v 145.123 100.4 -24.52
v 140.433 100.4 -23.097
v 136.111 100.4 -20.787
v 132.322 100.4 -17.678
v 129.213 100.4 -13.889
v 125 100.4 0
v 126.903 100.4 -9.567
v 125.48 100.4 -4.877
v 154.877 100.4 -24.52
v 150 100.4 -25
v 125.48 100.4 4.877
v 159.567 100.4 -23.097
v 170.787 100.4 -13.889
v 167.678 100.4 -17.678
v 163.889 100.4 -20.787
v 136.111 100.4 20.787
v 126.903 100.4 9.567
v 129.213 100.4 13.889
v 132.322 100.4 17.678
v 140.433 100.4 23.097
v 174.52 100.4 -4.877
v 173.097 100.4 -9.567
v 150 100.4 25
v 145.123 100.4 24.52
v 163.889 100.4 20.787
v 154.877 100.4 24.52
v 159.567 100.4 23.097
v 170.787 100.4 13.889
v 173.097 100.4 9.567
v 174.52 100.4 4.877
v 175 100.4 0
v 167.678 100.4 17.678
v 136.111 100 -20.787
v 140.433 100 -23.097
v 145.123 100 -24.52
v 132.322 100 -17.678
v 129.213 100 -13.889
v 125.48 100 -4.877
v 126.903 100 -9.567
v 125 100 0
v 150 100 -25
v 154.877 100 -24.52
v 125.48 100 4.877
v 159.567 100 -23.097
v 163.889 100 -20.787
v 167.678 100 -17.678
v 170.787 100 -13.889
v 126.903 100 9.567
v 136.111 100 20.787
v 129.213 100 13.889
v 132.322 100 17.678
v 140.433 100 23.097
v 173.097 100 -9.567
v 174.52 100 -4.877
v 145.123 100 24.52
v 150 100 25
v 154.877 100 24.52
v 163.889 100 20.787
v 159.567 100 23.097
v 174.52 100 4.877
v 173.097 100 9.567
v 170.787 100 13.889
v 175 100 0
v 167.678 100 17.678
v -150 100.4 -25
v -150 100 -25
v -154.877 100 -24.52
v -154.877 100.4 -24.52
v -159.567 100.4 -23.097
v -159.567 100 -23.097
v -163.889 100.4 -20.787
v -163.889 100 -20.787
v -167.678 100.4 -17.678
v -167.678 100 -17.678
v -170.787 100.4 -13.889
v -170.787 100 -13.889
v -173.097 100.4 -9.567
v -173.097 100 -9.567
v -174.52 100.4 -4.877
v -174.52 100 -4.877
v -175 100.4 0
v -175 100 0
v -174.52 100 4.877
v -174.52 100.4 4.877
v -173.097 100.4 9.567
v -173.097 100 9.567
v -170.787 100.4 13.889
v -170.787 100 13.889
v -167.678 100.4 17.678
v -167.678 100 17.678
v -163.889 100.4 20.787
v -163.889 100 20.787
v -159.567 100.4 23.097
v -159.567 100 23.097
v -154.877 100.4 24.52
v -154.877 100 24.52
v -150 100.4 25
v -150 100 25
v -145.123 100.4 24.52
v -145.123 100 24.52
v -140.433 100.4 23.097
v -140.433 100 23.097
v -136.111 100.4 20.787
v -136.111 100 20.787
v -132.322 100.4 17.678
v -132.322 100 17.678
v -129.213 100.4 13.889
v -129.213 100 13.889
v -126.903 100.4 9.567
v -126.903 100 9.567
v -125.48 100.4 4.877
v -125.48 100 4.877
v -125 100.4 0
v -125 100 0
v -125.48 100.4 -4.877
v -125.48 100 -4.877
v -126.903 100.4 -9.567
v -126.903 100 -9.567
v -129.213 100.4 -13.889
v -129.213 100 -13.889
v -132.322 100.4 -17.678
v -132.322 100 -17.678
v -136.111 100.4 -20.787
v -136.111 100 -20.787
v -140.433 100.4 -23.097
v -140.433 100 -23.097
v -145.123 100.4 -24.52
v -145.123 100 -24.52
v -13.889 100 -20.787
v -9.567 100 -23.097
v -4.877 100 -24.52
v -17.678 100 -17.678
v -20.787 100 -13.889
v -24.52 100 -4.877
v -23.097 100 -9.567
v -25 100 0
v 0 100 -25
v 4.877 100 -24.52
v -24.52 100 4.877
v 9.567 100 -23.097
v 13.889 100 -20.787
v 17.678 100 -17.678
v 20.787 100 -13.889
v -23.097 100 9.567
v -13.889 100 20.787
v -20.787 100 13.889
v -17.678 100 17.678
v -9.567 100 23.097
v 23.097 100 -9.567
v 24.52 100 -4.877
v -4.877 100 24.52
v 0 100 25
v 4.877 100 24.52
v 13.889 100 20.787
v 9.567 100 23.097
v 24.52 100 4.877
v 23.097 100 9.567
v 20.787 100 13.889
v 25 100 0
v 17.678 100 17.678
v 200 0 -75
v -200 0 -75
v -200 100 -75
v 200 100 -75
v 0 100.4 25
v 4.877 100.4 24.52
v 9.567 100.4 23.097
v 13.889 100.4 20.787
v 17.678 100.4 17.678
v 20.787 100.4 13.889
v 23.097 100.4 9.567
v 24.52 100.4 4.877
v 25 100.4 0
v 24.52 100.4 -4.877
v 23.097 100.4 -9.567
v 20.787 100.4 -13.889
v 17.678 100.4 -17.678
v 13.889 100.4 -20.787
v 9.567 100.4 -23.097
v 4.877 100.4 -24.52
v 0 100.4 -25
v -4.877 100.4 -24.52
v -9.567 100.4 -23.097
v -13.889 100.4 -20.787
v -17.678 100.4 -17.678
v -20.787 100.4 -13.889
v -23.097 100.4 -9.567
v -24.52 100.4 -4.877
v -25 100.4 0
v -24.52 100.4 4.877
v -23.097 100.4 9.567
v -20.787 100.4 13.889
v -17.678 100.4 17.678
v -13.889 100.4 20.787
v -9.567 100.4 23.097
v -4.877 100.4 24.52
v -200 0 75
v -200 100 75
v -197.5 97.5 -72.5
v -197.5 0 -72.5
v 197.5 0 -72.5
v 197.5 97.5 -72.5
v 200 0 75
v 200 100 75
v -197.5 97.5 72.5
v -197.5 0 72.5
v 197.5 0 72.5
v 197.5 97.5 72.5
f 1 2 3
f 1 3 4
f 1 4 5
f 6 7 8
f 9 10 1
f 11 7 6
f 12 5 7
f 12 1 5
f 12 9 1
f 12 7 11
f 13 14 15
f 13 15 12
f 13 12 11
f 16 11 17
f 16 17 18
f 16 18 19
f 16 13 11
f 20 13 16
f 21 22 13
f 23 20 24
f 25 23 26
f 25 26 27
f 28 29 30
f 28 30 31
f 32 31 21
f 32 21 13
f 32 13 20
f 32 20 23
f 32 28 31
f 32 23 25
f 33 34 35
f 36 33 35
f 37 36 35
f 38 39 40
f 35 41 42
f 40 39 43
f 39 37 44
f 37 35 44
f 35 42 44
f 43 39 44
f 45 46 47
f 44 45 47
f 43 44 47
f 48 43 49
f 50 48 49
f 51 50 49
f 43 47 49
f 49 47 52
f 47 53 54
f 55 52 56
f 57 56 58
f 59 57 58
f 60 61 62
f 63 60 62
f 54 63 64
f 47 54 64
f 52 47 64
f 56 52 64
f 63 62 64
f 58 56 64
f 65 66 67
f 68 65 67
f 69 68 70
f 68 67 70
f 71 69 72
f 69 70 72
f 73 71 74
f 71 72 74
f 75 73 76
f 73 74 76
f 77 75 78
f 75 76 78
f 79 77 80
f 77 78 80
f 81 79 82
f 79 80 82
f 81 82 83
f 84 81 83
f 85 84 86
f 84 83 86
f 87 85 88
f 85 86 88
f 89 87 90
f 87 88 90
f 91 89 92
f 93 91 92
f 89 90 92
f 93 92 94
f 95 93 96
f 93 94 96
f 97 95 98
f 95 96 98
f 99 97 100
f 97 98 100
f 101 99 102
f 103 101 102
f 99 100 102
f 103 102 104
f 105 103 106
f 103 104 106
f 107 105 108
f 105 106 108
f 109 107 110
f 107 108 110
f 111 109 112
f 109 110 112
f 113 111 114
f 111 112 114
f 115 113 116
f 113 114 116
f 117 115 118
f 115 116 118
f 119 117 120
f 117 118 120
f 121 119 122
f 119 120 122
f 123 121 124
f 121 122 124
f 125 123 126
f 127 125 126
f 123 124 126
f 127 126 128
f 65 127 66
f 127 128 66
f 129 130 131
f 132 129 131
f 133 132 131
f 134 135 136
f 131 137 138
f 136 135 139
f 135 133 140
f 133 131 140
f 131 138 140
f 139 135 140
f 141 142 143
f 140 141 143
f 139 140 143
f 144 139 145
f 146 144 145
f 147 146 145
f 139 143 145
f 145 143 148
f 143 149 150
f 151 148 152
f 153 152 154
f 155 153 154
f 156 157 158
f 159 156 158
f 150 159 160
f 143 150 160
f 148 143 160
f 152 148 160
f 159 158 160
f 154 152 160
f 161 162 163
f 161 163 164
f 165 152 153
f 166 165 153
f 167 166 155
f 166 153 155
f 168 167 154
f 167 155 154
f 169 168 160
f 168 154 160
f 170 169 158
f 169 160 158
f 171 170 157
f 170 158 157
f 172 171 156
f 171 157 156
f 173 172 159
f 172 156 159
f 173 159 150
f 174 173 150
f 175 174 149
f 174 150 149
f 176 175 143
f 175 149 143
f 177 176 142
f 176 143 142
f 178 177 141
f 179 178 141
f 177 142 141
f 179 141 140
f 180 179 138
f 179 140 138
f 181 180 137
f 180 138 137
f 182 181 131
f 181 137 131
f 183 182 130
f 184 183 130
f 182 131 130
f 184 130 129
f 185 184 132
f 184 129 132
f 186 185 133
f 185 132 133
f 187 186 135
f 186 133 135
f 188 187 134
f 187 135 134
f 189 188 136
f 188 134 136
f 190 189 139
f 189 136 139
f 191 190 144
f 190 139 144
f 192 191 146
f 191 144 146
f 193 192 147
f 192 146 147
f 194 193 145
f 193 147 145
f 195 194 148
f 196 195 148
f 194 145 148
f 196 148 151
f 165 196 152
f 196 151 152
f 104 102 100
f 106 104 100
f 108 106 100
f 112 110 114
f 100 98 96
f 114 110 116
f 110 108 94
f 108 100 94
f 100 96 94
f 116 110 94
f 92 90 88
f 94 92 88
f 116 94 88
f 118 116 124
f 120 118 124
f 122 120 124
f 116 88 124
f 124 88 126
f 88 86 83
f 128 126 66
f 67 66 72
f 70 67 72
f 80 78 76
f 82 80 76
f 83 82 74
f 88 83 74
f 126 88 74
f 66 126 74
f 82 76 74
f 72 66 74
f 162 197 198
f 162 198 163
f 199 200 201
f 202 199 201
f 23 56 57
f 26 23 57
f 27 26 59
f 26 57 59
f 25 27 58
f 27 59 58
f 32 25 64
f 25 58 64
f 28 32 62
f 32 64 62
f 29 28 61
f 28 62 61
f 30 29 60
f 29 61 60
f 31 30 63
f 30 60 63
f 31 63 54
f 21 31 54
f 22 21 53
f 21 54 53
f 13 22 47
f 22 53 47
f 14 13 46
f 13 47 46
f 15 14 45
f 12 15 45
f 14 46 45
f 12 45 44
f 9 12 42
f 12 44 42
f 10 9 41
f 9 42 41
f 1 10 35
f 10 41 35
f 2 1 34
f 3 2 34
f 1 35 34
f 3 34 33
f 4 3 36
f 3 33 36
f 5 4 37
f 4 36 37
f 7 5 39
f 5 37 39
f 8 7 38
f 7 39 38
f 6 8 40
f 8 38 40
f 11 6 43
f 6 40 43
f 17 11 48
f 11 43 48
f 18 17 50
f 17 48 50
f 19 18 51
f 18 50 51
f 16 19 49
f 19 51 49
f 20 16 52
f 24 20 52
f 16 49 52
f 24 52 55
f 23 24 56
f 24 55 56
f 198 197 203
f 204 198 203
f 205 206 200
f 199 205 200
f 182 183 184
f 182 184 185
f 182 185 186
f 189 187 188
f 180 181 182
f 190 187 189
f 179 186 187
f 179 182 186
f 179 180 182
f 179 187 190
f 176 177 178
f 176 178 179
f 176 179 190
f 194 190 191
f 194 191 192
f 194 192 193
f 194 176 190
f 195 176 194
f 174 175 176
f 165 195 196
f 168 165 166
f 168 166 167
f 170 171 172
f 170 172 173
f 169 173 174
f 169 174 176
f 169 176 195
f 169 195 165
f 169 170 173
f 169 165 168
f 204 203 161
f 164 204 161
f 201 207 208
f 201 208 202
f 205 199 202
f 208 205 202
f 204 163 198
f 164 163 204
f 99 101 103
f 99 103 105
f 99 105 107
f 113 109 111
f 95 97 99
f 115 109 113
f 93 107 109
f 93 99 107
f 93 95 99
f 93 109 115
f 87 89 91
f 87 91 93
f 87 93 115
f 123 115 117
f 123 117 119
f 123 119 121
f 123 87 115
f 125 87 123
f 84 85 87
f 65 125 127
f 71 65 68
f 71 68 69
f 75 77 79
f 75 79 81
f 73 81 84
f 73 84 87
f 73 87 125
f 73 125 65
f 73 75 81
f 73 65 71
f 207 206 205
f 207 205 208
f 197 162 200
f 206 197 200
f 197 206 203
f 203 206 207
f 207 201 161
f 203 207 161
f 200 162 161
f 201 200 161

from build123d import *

# Parameters (mm, degrees)
SKETCH_1_W        = 400
SKETCH_1_H        = 150
SKETCH_1_W_2      = 395
SKETCH_1_H_2      = 145
EXTRUDE_1_DEPTH   = 100
SKETCH_2_W        = 400
SKETCH_2_H        = 150
EXTRUDE_1_2_DEPTH = 2.5
SKETCH_3_R        = 25
EXTRUDE_2_DEPTH   = 0.4
EXTRUDE_2_2_DEPTH = 0.4
EXTRUDE_2_3_DEPTH = 0.4


with BuildPart() as part:
    # 草图1 → Extrude 1 (new body)
    with BuildSketch(Plane(origin=(0, 0, 0), x_dir=(1, 0, 0), z_dir=(0, 1, 0))):
        Rectangle(SKETCH_1_W, SKETCH_1_H)
        Rectangle(SKETCH_1_W_2, SKETCH_1_H_2, mode=Mode.SUBTRACT)
    extrude(amount=EXTRUDE_1_DEPTH)

    # 草图2 → Extrude 1 2 (add)
    with BuildSketch(Plane(origin=(0, 100, 0), x_dir=(1, 0, 0), z_dir=(0, 1, 0))):
        Rectangle(SKETCH_2_W, SKETCH_2_H)
    extrude(amount=-EXTRUDE_1_2_DEPTH)


with BuildPart() as body_2:
    # 草图3 → 凸台-拉伸2 (new body)
    with BuildSketch(Plane(origin=(0, 100, 0), x_dir=(1, 0, 0), z_dir=(0, 1, 0))):
        with Locations(Location((0, 0, 0), (0, 0, 270))):
            Circle(SKETCH_3_R)
    extrude(amount=EXTRUDE_2_DEPTH)


with BuildPart() as body_3:
    # 草图3 → Extrude 2 2 (new body)
    with BuildSketch(Plane(origin=(0, 100, 0), x_dir=(1, 0, 0), z_dir=(0, 1, 0))):
        with Locations(Location((150, 0, 0), (0, 0, 270))):
            Circle(SKETCH_3_R)
    extrude(amount=EXTRUDE_2_2_DEPTH)


with BuildPart() as body_4:
    # 草图3 → Extrude 2 3 (new body)
    with BuildSketch(Plane(origin=(0, 100, 0), x_dir=(1, 0, 0), z_dir=(0, 1, 0))):
        with Locations(Location((-150, 0, 0), (0, 0, 90))):
            Circle(SKETCH_3_R)
    extrude(amount=EXTRUDE_2_3_DEPTH)


solid = Compound([part.part, body_2.part, body_3.part, body_4.part])
